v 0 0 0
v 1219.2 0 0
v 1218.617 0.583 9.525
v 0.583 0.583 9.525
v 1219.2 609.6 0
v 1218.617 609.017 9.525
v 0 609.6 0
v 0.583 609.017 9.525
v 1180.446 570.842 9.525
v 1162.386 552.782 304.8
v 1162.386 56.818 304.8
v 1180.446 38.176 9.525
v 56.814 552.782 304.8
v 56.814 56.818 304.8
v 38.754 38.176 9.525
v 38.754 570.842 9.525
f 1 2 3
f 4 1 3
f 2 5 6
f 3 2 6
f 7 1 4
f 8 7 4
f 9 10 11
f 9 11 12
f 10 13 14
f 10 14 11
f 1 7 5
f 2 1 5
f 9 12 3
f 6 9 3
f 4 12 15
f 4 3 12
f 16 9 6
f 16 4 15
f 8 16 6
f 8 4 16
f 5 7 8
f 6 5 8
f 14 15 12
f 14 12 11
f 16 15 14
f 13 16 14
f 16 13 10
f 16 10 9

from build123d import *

# Parameters (mm, degrees)
F0_W     = 1219.2
F0_H     = 609.6
F1_DEPTH = 304.8
F1_TAPER = 3.5
F3_DEPTH = 1219.201
F5_DEPTH = 609.601


with BuildPart() as f1:
    # F0 (on Top) → F1 (new body)
    with BuildSketch(Plane.XY):
        with Locations((609.6, 304.8)):
            Rectangle(F0_W, F0_H)
    extrude(amount=F1_DEPTH, taper=F1_TAPER)

    # F2 (on Right) → F3 (cut, through all)
    with BuildSketch(Plane.YZ):
        Polygon((18.6423666219, 304.8), (0, 9.525), (38.1758597789, 9.525), (56.8182264007, 304.8), align=None)
        Polygon((570.8415662642, 9.525), (609.0174260431, 9.525), (590.9576333781, 304.8), (552.7817735993, 304.8), align=None)
    extrude(amount=F3_DEPTH, mode=Mode.SUBTRACT)

    # F4 (on Front) → F5 (cut, through all)
    with BuildSketch(Plane.XZ):
        Polygon((18.6423666219, 304.8), (0.5825739569, 9.525), (38.7537709338, 9.525), (56.8135635987, 304.8), align=None)
        Polygon((1218.6174260431, 9.525), (1200.5576333781, 304.8), (1162.3864364013, 304.8), (1180.4462290662, 9.525), align=None)
    extrude(amount=-F5_DEPTH, mode=Mode.SUBTRACT)


solid = f1.part
